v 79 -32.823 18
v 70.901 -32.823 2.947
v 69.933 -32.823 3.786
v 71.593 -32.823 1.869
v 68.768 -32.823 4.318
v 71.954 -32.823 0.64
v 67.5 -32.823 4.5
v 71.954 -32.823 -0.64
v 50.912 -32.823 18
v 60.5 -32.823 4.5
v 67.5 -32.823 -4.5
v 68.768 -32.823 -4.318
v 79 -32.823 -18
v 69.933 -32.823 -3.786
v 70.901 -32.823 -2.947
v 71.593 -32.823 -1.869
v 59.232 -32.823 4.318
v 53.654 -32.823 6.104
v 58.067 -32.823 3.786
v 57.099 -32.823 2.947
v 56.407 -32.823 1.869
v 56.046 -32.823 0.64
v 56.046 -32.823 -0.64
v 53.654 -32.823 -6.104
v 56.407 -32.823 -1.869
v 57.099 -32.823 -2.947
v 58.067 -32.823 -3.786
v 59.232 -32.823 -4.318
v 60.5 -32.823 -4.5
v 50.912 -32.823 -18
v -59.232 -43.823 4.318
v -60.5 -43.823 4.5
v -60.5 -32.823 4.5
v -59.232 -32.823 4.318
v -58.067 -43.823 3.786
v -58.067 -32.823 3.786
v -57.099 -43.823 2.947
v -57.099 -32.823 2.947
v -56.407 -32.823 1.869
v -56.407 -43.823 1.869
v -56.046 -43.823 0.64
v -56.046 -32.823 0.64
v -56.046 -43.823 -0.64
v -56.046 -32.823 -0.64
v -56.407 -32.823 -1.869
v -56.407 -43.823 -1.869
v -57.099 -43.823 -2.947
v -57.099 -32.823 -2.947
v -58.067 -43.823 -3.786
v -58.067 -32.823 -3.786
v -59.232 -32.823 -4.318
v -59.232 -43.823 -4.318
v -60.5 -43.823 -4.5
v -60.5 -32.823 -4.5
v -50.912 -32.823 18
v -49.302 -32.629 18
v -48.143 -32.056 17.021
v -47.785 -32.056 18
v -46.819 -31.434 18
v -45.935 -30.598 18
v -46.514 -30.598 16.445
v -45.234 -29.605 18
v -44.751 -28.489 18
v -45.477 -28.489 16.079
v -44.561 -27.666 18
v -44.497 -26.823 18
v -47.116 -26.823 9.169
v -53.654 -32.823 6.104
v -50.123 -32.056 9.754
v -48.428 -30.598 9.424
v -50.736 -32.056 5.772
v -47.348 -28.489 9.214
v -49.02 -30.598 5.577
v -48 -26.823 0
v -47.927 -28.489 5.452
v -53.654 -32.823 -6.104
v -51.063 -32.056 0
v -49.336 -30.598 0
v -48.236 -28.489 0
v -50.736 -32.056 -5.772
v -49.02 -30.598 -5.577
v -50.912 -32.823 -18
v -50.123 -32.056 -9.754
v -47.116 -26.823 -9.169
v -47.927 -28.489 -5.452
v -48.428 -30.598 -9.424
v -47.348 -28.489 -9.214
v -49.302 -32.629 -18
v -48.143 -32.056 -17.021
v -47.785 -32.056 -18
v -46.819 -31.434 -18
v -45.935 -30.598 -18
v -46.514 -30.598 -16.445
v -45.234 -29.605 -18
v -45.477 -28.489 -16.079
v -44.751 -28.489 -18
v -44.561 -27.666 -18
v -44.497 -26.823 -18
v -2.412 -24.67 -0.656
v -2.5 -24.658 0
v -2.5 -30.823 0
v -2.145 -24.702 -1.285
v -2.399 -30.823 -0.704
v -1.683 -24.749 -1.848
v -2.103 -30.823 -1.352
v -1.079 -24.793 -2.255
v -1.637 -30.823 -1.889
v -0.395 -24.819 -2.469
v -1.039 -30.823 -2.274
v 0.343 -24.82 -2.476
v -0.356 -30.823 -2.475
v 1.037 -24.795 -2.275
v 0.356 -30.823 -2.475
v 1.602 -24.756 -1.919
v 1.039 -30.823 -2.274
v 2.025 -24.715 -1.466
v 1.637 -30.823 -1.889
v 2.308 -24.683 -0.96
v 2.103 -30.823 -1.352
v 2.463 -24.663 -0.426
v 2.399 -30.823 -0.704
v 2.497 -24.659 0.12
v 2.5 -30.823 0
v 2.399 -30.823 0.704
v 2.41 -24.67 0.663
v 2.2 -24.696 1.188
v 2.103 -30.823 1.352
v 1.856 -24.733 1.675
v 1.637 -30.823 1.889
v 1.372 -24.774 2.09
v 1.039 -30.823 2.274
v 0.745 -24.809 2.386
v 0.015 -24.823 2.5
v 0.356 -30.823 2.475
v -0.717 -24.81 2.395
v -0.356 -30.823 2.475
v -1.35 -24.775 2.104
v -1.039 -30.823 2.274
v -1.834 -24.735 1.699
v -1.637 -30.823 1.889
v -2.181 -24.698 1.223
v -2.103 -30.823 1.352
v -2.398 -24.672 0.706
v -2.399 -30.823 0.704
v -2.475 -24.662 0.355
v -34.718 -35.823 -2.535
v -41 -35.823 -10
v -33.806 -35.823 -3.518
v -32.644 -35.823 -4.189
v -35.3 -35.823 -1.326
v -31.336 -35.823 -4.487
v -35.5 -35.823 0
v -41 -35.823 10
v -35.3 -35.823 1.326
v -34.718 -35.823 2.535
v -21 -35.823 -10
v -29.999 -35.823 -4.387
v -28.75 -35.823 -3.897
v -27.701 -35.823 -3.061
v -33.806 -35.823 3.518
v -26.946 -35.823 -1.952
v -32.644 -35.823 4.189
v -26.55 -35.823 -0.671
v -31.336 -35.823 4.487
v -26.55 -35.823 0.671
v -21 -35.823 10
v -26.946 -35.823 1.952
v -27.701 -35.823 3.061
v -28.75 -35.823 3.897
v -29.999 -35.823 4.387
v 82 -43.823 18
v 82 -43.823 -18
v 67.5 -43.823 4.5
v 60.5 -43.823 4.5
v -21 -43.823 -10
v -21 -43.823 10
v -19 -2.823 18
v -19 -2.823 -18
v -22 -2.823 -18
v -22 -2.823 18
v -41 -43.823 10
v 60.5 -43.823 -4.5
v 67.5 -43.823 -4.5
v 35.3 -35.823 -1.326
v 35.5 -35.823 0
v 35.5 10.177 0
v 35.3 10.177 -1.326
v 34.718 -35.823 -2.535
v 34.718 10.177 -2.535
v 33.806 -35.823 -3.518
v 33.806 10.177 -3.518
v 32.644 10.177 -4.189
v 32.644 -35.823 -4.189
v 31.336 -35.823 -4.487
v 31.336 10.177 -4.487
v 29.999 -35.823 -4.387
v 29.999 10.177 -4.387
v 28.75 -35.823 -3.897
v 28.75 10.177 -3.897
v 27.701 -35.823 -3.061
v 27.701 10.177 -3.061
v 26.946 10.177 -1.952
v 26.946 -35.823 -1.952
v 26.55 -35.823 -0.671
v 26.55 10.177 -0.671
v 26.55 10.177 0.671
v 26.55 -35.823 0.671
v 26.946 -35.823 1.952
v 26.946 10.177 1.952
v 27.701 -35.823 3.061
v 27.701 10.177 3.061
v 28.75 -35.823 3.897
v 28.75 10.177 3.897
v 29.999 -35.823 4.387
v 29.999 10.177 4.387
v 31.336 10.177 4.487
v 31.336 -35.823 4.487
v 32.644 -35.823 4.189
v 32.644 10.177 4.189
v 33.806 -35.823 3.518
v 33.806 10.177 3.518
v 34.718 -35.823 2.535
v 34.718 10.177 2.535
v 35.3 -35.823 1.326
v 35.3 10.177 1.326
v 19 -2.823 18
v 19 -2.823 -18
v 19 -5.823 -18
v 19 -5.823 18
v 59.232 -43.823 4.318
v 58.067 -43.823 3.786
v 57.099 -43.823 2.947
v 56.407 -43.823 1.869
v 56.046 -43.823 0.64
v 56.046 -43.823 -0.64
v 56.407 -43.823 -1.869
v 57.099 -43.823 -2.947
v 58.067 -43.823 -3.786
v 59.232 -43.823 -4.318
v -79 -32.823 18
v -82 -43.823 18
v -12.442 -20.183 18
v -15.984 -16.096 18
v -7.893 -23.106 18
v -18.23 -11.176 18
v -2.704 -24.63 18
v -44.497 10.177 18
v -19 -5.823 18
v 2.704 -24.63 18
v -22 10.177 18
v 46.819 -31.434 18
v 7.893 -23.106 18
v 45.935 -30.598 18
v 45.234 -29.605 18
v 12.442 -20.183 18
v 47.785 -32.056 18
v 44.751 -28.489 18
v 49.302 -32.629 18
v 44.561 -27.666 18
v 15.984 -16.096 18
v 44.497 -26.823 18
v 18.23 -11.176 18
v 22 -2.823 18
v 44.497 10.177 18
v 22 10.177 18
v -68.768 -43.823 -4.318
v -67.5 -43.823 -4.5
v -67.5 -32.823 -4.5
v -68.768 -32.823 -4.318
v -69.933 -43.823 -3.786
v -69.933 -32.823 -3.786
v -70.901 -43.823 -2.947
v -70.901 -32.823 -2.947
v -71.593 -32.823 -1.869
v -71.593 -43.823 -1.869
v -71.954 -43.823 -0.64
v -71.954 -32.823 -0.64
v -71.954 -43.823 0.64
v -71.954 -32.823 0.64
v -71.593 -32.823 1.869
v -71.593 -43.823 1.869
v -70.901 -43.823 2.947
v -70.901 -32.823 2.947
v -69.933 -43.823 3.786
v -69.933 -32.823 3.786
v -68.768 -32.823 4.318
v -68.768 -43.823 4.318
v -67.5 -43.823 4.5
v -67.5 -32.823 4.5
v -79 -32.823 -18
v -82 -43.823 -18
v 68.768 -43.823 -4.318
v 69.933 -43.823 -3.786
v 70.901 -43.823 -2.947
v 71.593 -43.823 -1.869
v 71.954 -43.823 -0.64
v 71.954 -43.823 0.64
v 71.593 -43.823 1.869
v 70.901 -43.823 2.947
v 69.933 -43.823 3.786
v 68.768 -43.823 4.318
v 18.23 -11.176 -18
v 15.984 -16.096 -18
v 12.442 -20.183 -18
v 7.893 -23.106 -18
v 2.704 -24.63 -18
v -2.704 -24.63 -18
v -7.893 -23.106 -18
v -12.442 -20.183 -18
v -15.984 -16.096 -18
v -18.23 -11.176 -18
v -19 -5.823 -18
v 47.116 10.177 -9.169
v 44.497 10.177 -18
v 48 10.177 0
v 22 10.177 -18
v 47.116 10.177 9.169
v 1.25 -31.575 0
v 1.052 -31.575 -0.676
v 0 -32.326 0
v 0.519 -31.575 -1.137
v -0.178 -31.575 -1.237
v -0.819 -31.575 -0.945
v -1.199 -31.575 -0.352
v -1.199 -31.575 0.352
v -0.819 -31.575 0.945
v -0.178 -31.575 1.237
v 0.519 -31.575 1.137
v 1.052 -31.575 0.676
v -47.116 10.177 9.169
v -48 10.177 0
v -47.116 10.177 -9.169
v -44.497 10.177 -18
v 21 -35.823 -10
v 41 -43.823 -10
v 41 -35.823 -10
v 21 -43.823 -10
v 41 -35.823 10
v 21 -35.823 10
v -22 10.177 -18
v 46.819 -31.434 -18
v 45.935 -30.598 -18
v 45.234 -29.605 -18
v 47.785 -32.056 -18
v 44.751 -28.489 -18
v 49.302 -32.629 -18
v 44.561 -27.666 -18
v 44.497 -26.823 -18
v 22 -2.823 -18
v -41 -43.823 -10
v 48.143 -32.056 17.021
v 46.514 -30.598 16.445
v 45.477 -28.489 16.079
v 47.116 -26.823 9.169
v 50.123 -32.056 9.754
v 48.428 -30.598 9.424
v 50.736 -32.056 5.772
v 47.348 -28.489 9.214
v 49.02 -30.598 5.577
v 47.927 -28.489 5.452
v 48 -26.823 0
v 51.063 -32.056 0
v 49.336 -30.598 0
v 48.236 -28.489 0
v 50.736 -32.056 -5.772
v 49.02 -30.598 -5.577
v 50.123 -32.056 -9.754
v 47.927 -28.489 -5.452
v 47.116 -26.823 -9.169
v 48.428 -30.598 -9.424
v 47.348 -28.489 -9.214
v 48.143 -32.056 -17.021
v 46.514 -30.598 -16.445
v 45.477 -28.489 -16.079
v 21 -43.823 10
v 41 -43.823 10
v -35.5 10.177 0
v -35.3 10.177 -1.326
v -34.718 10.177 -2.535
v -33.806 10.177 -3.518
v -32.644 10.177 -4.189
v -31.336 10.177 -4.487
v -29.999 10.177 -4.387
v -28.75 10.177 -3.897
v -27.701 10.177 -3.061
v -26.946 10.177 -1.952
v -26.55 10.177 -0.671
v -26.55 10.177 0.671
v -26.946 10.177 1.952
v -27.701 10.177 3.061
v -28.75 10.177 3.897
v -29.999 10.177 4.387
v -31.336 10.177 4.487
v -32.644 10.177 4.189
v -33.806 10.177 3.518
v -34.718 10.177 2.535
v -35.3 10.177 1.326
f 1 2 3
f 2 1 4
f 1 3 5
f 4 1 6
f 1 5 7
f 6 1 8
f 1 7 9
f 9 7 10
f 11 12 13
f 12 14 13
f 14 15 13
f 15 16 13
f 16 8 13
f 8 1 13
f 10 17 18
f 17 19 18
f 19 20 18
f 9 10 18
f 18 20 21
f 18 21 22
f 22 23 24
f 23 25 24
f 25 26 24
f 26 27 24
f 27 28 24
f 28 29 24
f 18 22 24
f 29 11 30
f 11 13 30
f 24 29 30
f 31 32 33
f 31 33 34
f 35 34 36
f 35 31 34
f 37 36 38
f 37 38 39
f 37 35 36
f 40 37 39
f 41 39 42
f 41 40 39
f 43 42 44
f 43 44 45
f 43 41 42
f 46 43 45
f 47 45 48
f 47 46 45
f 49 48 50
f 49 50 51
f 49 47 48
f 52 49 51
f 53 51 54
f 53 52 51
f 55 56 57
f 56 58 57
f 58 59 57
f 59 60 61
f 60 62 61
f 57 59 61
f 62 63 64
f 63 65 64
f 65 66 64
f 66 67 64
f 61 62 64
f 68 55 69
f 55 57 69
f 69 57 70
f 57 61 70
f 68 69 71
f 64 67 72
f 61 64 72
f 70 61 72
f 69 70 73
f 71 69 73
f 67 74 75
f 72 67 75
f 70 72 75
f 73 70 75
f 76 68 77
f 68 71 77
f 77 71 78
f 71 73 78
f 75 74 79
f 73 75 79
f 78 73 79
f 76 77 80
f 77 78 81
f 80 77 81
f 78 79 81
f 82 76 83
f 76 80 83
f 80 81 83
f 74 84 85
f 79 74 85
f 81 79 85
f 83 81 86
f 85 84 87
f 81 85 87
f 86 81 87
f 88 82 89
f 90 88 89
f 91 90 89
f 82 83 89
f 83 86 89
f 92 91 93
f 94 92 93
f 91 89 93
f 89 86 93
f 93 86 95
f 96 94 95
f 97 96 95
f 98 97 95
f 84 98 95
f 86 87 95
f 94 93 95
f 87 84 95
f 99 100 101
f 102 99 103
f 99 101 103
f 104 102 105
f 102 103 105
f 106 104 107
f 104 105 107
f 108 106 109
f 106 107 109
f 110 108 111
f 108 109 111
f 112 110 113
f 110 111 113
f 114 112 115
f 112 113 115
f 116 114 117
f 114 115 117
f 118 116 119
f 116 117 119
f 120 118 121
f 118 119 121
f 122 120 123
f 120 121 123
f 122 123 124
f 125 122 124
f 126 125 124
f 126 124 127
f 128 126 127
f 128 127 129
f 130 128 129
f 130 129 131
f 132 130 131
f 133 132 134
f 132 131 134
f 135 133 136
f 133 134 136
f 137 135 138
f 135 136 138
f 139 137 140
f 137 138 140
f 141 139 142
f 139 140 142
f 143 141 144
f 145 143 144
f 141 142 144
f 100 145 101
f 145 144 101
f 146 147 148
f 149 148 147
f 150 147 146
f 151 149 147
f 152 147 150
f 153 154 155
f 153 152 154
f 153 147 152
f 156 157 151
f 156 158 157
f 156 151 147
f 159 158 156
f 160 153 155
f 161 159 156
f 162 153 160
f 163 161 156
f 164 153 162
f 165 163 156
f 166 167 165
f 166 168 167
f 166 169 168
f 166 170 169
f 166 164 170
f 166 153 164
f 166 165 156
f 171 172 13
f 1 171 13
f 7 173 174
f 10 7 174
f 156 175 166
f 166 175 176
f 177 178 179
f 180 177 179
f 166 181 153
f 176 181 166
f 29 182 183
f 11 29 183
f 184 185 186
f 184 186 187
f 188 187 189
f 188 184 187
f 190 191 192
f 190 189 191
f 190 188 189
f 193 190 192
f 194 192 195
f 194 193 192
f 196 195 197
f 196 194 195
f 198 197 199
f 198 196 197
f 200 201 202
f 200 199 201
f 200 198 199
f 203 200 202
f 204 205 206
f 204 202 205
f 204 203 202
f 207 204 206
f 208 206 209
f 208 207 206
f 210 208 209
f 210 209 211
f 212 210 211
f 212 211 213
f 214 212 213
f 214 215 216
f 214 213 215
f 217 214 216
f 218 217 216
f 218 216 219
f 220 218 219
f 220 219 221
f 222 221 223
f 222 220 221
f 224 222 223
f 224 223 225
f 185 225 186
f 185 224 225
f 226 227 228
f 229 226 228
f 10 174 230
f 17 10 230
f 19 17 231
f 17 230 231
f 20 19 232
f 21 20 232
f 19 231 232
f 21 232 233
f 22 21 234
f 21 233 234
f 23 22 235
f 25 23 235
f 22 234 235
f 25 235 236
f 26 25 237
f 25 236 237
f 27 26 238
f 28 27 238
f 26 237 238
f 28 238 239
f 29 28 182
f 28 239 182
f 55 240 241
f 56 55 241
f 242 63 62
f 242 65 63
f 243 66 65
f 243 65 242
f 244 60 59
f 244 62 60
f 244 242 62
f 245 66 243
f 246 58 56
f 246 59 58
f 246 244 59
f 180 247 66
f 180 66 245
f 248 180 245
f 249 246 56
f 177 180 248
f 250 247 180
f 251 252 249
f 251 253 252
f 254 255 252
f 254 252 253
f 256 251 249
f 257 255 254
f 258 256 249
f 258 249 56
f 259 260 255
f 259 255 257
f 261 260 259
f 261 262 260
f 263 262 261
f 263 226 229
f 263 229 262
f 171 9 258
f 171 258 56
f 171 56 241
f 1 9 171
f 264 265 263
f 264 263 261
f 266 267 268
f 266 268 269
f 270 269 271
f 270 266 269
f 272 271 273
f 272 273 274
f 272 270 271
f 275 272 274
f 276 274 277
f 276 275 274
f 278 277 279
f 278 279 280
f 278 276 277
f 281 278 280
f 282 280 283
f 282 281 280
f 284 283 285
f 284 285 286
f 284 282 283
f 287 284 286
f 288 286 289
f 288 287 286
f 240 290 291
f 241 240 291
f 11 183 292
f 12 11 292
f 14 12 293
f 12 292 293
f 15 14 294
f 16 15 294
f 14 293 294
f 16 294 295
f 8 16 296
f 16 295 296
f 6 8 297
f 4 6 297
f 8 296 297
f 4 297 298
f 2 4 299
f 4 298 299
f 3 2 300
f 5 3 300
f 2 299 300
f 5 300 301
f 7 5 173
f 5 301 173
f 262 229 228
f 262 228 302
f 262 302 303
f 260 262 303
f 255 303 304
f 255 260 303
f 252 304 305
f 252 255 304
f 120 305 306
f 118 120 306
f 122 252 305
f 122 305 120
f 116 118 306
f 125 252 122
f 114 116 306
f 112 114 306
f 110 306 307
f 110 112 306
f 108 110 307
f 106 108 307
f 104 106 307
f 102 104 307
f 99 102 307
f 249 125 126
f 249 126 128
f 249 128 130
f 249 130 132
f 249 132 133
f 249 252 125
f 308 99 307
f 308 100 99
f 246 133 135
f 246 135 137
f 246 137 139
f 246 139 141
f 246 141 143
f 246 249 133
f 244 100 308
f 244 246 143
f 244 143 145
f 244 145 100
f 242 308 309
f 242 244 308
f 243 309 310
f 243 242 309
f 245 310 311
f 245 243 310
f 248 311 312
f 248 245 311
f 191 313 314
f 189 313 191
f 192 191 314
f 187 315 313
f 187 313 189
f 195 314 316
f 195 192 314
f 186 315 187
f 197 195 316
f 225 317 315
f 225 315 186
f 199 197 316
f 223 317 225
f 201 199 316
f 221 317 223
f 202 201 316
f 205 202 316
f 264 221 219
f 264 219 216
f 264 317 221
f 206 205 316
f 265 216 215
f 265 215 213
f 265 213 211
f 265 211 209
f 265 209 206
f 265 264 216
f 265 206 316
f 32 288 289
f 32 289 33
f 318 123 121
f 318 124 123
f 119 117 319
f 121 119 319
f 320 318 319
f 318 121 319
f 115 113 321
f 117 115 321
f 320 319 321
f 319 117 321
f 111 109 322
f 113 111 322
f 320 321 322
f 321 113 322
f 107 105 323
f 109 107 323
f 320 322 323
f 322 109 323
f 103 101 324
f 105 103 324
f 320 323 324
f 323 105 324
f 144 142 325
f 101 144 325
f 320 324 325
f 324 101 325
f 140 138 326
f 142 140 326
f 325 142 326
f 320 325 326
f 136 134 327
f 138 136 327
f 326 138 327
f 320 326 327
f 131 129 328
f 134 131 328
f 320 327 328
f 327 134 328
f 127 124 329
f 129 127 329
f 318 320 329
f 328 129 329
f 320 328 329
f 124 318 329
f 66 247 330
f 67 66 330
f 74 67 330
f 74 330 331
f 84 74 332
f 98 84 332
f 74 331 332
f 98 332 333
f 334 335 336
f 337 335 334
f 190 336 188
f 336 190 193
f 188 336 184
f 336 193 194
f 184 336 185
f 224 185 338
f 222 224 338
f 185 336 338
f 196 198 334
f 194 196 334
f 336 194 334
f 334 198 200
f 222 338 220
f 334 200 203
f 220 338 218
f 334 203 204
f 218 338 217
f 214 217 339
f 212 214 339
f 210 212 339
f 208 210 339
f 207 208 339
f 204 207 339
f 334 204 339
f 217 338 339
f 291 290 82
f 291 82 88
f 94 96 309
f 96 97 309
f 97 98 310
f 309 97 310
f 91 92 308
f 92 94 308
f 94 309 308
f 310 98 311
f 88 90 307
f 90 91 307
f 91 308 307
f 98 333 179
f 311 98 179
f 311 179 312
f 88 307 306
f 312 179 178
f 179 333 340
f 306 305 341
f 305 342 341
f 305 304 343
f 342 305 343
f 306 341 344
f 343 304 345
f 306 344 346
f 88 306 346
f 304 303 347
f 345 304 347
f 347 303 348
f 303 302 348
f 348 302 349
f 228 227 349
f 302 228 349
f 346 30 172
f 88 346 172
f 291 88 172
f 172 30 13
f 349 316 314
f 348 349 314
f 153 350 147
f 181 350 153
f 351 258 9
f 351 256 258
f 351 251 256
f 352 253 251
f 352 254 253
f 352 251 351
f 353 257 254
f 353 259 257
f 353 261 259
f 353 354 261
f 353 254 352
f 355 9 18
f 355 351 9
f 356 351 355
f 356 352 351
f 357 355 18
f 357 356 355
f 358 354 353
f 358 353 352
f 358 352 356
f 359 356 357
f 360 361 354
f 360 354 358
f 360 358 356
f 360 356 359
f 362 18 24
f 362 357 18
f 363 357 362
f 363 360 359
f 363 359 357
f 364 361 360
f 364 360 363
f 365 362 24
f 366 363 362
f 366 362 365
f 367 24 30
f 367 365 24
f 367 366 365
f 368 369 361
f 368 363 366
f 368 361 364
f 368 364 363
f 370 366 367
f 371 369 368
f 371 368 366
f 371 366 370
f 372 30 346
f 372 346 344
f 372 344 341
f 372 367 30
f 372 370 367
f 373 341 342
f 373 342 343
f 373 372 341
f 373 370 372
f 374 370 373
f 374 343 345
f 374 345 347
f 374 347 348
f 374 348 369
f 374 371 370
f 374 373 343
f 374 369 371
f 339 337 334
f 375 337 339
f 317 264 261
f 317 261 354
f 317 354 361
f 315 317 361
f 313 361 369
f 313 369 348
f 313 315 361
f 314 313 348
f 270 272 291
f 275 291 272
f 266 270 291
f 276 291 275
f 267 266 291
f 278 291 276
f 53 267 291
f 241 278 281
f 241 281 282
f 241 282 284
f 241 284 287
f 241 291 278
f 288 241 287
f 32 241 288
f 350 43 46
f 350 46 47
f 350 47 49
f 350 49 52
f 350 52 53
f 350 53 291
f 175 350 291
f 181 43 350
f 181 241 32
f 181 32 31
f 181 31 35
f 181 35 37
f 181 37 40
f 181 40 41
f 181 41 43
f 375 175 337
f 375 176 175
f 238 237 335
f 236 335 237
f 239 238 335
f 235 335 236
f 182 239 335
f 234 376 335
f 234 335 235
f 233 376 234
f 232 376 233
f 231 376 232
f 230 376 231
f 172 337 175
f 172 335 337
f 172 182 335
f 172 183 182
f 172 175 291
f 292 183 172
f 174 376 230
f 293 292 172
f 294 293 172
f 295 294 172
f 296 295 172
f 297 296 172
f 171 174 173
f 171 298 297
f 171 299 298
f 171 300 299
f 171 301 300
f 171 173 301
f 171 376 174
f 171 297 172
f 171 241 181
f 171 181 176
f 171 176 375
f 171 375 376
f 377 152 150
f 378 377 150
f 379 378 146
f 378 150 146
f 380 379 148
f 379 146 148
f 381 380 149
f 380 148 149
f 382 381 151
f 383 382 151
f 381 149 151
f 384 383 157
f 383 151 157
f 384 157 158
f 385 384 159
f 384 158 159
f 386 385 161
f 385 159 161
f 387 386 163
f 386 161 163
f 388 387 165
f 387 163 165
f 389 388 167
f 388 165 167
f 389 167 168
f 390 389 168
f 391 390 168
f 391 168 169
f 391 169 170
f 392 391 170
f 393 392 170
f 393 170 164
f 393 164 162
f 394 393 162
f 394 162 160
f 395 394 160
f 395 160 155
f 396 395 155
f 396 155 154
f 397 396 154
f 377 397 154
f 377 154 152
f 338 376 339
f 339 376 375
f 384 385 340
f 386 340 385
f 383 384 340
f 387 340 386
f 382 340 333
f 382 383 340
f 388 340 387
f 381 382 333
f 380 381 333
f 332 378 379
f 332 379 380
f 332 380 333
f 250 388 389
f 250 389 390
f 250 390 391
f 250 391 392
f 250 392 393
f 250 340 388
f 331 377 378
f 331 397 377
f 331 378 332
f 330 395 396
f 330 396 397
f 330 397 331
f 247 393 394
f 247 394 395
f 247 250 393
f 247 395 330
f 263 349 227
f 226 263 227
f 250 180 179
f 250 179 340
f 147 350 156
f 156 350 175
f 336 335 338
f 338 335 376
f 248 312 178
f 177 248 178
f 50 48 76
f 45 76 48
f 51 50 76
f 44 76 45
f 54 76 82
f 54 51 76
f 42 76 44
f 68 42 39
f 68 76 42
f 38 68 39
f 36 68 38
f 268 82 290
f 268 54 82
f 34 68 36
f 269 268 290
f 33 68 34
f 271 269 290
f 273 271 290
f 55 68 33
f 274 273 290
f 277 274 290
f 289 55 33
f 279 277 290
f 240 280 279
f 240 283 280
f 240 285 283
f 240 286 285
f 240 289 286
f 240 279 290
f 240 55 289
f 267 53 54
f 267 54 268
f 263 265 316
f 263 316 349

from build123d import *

# Parameters (mm, degrees)
BOSS_EXTRUDE3_DEPTH   = 18
CUT_EXTRUDE1_DEPTH    = 43
M6_TAPPED_HOLE1_D     = 5
M6_TAPPED_HOLE1_DEPTH = 6
M6_TAPPED_HOLE1_TIP   = 1.502151548
M10_TAPPED_HOLE1_D    = 9
SKETCH9_W             = 20
SKETCH9_H             = 20
CUT_EXTRUDE2_DEPTH    = 8
CUT_EXTRUDE3_DEPTH    = 11
FILLET2_R             = 6
FILLET3_R             = 6


with BuildPart() as part:
    # Sketch1 → Boss-Extrude3 (new body, symmetric)
    with BuildSketch(Plane.XY):
        with BuildLine():
            Line((-82, -43.82348407), (82, -43.82348407))
            Line((82, -43.82348407), (79, -32.82348407))
            Line((79, -32.82348407), (50, -32.82348407))
            Line((50, -32.82348407), (50, 10.17651593))
            Line((50, 10.17651593), (22, 10.17651593))
            Line((22, 10.17651593), (22, -2.82348407))
            Line((22, -2.82348407), (19, -2.82348407))
            Line((19, -2.82348407), (19, -5.82348407))
            ThreePointArc((19, -5.82348407), (0, -24.82348407), (-19, -5.82348407))
            Line((-19, -5.82348407), (-19, -2.82348407))
            Line((-19, -2.82348407), (-22, -2.82348407))
            Line((-22, -2.82348407), (-22, 10.17651593))
            Line((-22, 10.17651593), (-50, 10.17651593))
            Line((-50, 10.17651593), (-50, -32.82348407))
            Line((-50, -32.82348407), (-79, -32.82348407))
            Line((-79, -32.82348407), (-82, -43.82348407))
        make_face()
    extrude(amount=BOSS_EXTRUDE3_DEPTH, both=True)

    # Sketch3 → Cut-Extrude1 (cut)
    with BuildSketch(Plane(origin=(0, 10.17651593, 0), x_dir=(1, 0, 0), z_dir=(0, 1, 0))):
        with BuildLine():
            Line((-44.497190923, 18), (-50, 18))
            Line((-50, 18), (-50, -18))
            Line((-50, -18), (-44.497190923, -18))
            ThreePointArc((-44.497190923, -18), (-48, 0), (-44.497190923, 18))
        make_face()
    cut_extrude1 = extrude(amount=-CUT_EXTRUDE1_DEPTH, mode=Mode.SUBTRACT)

    # Mirror1: Cut-Extrude1 across plane
    add(cut_extrude1.mirror(Plane(origin=(0, 0, 0), x_dir=(0, 0, 1), z_dir=(1, 0, 0))), mode=Mode.SUBTRACT)

    # M6 Tapped Hole1
    with Locations(Plane(origin=(0, -24.82348407, 0), x_dir=(1, 0, 0), z_dir=(0, 1, 0))):
        with Locations((0, 0)):
            Hole(M6_TAPPED_HOLE1_D / 2, depth=M6_TAPPED_HOLE1_DEPTH)
            with Locations((0, 0, -(M6_TAPPED_HOLE1_DEPTH + M6_TAPPED_HOLE1_TIP / 2))):  # 118° drill point
                Cone(0, M6_TAPPED_HOLE1_D / 2, M6_TAPPED_HOLE1_TIP, mode=Mode.SUBTRACT)

    # M10 Tapped Hole1 (through all)
    with Locations(Plane(origin=(0, 10.17651593, 0), x_dir=(1, 0, 0), z_dir=(0, 1, 0))):
        with Locations((-31, 0)):
            m10_tapped_hole1 = Hole(M10_TAPPED_HOLE1_D / 2)

    # Sketch9 → Cut-Extrude2 (cut)
    with BuildSketch(Plane.XZ.offset(43.82348407)):
        with Locations((-31, 0)):
            Rectangle(SKETCH9_W, SKETCH9_H)
    cut_extrude2 = extrude(amount=-CUT_EXTRUDE2_DEPTH, mode=Mode.SUBTRACT)

    # Sketch10 → Cut-Extrude3 (cut)
    with BuildSketch(Plane.XZ.offset(43.82348407)):
        with BuildLine():
            Line((-67.5, 4.5), (-60.5, 4.5))
            ThreePointArc((-60.5, 4.5), (-56, 0), (-60.5, -4.5))
            Line((-60.5, -4.5), (-67.5, -4.5))
            ThreePointArc((-67.5, -4.5), (-72, 0), (-67.5, 4.5))
        make_face()
    cut_extrude3 = extrude(amount=-CUT_EXTRUDE3_DEPTH, mode=Mode.SUBTRACT)

    # Mirror2: M10 Tapped Hole1, Cut-Extrude2, Cut-Extrude3 across plane
    add(m10_tapped_hole1.mirror(Plane(origin=(0, 0, 0), x_dir=(0, 0, 1), z_dir=(1, 0, 0))), mode=Mode.SUBTRACT)
    add(cut_extrude2.mirror(Plane(origin=(0, 0, 0), x_dir=(0, 0, 1), z_dir=(1, 0, 0))), mode=Mode.SUBTRACT)
    add(cut_extrude3.mirror(Plane(origin=(0, 0, 0), x_dir=(0, 0, 1), z_dir=(1, 0, 0))), mode=Mode.SUBTRACT)

    # Fillet2
    fillet2_edges = [part.edges().sort_by_distance(p)[0] for p in [
        (-48, -32.82348407, 0),
    ]]
    fillet(fillet2_edges, radius=FILLET2_R)

    # Fillet3
    fillet3_edges = [part.edges().sort_by_distance(p)[0] for p in [
        (48, -32.82348407, 0),
    ]]
    fillet(fillet3_edges, radius=FILLET3_R)


solid = part.part
